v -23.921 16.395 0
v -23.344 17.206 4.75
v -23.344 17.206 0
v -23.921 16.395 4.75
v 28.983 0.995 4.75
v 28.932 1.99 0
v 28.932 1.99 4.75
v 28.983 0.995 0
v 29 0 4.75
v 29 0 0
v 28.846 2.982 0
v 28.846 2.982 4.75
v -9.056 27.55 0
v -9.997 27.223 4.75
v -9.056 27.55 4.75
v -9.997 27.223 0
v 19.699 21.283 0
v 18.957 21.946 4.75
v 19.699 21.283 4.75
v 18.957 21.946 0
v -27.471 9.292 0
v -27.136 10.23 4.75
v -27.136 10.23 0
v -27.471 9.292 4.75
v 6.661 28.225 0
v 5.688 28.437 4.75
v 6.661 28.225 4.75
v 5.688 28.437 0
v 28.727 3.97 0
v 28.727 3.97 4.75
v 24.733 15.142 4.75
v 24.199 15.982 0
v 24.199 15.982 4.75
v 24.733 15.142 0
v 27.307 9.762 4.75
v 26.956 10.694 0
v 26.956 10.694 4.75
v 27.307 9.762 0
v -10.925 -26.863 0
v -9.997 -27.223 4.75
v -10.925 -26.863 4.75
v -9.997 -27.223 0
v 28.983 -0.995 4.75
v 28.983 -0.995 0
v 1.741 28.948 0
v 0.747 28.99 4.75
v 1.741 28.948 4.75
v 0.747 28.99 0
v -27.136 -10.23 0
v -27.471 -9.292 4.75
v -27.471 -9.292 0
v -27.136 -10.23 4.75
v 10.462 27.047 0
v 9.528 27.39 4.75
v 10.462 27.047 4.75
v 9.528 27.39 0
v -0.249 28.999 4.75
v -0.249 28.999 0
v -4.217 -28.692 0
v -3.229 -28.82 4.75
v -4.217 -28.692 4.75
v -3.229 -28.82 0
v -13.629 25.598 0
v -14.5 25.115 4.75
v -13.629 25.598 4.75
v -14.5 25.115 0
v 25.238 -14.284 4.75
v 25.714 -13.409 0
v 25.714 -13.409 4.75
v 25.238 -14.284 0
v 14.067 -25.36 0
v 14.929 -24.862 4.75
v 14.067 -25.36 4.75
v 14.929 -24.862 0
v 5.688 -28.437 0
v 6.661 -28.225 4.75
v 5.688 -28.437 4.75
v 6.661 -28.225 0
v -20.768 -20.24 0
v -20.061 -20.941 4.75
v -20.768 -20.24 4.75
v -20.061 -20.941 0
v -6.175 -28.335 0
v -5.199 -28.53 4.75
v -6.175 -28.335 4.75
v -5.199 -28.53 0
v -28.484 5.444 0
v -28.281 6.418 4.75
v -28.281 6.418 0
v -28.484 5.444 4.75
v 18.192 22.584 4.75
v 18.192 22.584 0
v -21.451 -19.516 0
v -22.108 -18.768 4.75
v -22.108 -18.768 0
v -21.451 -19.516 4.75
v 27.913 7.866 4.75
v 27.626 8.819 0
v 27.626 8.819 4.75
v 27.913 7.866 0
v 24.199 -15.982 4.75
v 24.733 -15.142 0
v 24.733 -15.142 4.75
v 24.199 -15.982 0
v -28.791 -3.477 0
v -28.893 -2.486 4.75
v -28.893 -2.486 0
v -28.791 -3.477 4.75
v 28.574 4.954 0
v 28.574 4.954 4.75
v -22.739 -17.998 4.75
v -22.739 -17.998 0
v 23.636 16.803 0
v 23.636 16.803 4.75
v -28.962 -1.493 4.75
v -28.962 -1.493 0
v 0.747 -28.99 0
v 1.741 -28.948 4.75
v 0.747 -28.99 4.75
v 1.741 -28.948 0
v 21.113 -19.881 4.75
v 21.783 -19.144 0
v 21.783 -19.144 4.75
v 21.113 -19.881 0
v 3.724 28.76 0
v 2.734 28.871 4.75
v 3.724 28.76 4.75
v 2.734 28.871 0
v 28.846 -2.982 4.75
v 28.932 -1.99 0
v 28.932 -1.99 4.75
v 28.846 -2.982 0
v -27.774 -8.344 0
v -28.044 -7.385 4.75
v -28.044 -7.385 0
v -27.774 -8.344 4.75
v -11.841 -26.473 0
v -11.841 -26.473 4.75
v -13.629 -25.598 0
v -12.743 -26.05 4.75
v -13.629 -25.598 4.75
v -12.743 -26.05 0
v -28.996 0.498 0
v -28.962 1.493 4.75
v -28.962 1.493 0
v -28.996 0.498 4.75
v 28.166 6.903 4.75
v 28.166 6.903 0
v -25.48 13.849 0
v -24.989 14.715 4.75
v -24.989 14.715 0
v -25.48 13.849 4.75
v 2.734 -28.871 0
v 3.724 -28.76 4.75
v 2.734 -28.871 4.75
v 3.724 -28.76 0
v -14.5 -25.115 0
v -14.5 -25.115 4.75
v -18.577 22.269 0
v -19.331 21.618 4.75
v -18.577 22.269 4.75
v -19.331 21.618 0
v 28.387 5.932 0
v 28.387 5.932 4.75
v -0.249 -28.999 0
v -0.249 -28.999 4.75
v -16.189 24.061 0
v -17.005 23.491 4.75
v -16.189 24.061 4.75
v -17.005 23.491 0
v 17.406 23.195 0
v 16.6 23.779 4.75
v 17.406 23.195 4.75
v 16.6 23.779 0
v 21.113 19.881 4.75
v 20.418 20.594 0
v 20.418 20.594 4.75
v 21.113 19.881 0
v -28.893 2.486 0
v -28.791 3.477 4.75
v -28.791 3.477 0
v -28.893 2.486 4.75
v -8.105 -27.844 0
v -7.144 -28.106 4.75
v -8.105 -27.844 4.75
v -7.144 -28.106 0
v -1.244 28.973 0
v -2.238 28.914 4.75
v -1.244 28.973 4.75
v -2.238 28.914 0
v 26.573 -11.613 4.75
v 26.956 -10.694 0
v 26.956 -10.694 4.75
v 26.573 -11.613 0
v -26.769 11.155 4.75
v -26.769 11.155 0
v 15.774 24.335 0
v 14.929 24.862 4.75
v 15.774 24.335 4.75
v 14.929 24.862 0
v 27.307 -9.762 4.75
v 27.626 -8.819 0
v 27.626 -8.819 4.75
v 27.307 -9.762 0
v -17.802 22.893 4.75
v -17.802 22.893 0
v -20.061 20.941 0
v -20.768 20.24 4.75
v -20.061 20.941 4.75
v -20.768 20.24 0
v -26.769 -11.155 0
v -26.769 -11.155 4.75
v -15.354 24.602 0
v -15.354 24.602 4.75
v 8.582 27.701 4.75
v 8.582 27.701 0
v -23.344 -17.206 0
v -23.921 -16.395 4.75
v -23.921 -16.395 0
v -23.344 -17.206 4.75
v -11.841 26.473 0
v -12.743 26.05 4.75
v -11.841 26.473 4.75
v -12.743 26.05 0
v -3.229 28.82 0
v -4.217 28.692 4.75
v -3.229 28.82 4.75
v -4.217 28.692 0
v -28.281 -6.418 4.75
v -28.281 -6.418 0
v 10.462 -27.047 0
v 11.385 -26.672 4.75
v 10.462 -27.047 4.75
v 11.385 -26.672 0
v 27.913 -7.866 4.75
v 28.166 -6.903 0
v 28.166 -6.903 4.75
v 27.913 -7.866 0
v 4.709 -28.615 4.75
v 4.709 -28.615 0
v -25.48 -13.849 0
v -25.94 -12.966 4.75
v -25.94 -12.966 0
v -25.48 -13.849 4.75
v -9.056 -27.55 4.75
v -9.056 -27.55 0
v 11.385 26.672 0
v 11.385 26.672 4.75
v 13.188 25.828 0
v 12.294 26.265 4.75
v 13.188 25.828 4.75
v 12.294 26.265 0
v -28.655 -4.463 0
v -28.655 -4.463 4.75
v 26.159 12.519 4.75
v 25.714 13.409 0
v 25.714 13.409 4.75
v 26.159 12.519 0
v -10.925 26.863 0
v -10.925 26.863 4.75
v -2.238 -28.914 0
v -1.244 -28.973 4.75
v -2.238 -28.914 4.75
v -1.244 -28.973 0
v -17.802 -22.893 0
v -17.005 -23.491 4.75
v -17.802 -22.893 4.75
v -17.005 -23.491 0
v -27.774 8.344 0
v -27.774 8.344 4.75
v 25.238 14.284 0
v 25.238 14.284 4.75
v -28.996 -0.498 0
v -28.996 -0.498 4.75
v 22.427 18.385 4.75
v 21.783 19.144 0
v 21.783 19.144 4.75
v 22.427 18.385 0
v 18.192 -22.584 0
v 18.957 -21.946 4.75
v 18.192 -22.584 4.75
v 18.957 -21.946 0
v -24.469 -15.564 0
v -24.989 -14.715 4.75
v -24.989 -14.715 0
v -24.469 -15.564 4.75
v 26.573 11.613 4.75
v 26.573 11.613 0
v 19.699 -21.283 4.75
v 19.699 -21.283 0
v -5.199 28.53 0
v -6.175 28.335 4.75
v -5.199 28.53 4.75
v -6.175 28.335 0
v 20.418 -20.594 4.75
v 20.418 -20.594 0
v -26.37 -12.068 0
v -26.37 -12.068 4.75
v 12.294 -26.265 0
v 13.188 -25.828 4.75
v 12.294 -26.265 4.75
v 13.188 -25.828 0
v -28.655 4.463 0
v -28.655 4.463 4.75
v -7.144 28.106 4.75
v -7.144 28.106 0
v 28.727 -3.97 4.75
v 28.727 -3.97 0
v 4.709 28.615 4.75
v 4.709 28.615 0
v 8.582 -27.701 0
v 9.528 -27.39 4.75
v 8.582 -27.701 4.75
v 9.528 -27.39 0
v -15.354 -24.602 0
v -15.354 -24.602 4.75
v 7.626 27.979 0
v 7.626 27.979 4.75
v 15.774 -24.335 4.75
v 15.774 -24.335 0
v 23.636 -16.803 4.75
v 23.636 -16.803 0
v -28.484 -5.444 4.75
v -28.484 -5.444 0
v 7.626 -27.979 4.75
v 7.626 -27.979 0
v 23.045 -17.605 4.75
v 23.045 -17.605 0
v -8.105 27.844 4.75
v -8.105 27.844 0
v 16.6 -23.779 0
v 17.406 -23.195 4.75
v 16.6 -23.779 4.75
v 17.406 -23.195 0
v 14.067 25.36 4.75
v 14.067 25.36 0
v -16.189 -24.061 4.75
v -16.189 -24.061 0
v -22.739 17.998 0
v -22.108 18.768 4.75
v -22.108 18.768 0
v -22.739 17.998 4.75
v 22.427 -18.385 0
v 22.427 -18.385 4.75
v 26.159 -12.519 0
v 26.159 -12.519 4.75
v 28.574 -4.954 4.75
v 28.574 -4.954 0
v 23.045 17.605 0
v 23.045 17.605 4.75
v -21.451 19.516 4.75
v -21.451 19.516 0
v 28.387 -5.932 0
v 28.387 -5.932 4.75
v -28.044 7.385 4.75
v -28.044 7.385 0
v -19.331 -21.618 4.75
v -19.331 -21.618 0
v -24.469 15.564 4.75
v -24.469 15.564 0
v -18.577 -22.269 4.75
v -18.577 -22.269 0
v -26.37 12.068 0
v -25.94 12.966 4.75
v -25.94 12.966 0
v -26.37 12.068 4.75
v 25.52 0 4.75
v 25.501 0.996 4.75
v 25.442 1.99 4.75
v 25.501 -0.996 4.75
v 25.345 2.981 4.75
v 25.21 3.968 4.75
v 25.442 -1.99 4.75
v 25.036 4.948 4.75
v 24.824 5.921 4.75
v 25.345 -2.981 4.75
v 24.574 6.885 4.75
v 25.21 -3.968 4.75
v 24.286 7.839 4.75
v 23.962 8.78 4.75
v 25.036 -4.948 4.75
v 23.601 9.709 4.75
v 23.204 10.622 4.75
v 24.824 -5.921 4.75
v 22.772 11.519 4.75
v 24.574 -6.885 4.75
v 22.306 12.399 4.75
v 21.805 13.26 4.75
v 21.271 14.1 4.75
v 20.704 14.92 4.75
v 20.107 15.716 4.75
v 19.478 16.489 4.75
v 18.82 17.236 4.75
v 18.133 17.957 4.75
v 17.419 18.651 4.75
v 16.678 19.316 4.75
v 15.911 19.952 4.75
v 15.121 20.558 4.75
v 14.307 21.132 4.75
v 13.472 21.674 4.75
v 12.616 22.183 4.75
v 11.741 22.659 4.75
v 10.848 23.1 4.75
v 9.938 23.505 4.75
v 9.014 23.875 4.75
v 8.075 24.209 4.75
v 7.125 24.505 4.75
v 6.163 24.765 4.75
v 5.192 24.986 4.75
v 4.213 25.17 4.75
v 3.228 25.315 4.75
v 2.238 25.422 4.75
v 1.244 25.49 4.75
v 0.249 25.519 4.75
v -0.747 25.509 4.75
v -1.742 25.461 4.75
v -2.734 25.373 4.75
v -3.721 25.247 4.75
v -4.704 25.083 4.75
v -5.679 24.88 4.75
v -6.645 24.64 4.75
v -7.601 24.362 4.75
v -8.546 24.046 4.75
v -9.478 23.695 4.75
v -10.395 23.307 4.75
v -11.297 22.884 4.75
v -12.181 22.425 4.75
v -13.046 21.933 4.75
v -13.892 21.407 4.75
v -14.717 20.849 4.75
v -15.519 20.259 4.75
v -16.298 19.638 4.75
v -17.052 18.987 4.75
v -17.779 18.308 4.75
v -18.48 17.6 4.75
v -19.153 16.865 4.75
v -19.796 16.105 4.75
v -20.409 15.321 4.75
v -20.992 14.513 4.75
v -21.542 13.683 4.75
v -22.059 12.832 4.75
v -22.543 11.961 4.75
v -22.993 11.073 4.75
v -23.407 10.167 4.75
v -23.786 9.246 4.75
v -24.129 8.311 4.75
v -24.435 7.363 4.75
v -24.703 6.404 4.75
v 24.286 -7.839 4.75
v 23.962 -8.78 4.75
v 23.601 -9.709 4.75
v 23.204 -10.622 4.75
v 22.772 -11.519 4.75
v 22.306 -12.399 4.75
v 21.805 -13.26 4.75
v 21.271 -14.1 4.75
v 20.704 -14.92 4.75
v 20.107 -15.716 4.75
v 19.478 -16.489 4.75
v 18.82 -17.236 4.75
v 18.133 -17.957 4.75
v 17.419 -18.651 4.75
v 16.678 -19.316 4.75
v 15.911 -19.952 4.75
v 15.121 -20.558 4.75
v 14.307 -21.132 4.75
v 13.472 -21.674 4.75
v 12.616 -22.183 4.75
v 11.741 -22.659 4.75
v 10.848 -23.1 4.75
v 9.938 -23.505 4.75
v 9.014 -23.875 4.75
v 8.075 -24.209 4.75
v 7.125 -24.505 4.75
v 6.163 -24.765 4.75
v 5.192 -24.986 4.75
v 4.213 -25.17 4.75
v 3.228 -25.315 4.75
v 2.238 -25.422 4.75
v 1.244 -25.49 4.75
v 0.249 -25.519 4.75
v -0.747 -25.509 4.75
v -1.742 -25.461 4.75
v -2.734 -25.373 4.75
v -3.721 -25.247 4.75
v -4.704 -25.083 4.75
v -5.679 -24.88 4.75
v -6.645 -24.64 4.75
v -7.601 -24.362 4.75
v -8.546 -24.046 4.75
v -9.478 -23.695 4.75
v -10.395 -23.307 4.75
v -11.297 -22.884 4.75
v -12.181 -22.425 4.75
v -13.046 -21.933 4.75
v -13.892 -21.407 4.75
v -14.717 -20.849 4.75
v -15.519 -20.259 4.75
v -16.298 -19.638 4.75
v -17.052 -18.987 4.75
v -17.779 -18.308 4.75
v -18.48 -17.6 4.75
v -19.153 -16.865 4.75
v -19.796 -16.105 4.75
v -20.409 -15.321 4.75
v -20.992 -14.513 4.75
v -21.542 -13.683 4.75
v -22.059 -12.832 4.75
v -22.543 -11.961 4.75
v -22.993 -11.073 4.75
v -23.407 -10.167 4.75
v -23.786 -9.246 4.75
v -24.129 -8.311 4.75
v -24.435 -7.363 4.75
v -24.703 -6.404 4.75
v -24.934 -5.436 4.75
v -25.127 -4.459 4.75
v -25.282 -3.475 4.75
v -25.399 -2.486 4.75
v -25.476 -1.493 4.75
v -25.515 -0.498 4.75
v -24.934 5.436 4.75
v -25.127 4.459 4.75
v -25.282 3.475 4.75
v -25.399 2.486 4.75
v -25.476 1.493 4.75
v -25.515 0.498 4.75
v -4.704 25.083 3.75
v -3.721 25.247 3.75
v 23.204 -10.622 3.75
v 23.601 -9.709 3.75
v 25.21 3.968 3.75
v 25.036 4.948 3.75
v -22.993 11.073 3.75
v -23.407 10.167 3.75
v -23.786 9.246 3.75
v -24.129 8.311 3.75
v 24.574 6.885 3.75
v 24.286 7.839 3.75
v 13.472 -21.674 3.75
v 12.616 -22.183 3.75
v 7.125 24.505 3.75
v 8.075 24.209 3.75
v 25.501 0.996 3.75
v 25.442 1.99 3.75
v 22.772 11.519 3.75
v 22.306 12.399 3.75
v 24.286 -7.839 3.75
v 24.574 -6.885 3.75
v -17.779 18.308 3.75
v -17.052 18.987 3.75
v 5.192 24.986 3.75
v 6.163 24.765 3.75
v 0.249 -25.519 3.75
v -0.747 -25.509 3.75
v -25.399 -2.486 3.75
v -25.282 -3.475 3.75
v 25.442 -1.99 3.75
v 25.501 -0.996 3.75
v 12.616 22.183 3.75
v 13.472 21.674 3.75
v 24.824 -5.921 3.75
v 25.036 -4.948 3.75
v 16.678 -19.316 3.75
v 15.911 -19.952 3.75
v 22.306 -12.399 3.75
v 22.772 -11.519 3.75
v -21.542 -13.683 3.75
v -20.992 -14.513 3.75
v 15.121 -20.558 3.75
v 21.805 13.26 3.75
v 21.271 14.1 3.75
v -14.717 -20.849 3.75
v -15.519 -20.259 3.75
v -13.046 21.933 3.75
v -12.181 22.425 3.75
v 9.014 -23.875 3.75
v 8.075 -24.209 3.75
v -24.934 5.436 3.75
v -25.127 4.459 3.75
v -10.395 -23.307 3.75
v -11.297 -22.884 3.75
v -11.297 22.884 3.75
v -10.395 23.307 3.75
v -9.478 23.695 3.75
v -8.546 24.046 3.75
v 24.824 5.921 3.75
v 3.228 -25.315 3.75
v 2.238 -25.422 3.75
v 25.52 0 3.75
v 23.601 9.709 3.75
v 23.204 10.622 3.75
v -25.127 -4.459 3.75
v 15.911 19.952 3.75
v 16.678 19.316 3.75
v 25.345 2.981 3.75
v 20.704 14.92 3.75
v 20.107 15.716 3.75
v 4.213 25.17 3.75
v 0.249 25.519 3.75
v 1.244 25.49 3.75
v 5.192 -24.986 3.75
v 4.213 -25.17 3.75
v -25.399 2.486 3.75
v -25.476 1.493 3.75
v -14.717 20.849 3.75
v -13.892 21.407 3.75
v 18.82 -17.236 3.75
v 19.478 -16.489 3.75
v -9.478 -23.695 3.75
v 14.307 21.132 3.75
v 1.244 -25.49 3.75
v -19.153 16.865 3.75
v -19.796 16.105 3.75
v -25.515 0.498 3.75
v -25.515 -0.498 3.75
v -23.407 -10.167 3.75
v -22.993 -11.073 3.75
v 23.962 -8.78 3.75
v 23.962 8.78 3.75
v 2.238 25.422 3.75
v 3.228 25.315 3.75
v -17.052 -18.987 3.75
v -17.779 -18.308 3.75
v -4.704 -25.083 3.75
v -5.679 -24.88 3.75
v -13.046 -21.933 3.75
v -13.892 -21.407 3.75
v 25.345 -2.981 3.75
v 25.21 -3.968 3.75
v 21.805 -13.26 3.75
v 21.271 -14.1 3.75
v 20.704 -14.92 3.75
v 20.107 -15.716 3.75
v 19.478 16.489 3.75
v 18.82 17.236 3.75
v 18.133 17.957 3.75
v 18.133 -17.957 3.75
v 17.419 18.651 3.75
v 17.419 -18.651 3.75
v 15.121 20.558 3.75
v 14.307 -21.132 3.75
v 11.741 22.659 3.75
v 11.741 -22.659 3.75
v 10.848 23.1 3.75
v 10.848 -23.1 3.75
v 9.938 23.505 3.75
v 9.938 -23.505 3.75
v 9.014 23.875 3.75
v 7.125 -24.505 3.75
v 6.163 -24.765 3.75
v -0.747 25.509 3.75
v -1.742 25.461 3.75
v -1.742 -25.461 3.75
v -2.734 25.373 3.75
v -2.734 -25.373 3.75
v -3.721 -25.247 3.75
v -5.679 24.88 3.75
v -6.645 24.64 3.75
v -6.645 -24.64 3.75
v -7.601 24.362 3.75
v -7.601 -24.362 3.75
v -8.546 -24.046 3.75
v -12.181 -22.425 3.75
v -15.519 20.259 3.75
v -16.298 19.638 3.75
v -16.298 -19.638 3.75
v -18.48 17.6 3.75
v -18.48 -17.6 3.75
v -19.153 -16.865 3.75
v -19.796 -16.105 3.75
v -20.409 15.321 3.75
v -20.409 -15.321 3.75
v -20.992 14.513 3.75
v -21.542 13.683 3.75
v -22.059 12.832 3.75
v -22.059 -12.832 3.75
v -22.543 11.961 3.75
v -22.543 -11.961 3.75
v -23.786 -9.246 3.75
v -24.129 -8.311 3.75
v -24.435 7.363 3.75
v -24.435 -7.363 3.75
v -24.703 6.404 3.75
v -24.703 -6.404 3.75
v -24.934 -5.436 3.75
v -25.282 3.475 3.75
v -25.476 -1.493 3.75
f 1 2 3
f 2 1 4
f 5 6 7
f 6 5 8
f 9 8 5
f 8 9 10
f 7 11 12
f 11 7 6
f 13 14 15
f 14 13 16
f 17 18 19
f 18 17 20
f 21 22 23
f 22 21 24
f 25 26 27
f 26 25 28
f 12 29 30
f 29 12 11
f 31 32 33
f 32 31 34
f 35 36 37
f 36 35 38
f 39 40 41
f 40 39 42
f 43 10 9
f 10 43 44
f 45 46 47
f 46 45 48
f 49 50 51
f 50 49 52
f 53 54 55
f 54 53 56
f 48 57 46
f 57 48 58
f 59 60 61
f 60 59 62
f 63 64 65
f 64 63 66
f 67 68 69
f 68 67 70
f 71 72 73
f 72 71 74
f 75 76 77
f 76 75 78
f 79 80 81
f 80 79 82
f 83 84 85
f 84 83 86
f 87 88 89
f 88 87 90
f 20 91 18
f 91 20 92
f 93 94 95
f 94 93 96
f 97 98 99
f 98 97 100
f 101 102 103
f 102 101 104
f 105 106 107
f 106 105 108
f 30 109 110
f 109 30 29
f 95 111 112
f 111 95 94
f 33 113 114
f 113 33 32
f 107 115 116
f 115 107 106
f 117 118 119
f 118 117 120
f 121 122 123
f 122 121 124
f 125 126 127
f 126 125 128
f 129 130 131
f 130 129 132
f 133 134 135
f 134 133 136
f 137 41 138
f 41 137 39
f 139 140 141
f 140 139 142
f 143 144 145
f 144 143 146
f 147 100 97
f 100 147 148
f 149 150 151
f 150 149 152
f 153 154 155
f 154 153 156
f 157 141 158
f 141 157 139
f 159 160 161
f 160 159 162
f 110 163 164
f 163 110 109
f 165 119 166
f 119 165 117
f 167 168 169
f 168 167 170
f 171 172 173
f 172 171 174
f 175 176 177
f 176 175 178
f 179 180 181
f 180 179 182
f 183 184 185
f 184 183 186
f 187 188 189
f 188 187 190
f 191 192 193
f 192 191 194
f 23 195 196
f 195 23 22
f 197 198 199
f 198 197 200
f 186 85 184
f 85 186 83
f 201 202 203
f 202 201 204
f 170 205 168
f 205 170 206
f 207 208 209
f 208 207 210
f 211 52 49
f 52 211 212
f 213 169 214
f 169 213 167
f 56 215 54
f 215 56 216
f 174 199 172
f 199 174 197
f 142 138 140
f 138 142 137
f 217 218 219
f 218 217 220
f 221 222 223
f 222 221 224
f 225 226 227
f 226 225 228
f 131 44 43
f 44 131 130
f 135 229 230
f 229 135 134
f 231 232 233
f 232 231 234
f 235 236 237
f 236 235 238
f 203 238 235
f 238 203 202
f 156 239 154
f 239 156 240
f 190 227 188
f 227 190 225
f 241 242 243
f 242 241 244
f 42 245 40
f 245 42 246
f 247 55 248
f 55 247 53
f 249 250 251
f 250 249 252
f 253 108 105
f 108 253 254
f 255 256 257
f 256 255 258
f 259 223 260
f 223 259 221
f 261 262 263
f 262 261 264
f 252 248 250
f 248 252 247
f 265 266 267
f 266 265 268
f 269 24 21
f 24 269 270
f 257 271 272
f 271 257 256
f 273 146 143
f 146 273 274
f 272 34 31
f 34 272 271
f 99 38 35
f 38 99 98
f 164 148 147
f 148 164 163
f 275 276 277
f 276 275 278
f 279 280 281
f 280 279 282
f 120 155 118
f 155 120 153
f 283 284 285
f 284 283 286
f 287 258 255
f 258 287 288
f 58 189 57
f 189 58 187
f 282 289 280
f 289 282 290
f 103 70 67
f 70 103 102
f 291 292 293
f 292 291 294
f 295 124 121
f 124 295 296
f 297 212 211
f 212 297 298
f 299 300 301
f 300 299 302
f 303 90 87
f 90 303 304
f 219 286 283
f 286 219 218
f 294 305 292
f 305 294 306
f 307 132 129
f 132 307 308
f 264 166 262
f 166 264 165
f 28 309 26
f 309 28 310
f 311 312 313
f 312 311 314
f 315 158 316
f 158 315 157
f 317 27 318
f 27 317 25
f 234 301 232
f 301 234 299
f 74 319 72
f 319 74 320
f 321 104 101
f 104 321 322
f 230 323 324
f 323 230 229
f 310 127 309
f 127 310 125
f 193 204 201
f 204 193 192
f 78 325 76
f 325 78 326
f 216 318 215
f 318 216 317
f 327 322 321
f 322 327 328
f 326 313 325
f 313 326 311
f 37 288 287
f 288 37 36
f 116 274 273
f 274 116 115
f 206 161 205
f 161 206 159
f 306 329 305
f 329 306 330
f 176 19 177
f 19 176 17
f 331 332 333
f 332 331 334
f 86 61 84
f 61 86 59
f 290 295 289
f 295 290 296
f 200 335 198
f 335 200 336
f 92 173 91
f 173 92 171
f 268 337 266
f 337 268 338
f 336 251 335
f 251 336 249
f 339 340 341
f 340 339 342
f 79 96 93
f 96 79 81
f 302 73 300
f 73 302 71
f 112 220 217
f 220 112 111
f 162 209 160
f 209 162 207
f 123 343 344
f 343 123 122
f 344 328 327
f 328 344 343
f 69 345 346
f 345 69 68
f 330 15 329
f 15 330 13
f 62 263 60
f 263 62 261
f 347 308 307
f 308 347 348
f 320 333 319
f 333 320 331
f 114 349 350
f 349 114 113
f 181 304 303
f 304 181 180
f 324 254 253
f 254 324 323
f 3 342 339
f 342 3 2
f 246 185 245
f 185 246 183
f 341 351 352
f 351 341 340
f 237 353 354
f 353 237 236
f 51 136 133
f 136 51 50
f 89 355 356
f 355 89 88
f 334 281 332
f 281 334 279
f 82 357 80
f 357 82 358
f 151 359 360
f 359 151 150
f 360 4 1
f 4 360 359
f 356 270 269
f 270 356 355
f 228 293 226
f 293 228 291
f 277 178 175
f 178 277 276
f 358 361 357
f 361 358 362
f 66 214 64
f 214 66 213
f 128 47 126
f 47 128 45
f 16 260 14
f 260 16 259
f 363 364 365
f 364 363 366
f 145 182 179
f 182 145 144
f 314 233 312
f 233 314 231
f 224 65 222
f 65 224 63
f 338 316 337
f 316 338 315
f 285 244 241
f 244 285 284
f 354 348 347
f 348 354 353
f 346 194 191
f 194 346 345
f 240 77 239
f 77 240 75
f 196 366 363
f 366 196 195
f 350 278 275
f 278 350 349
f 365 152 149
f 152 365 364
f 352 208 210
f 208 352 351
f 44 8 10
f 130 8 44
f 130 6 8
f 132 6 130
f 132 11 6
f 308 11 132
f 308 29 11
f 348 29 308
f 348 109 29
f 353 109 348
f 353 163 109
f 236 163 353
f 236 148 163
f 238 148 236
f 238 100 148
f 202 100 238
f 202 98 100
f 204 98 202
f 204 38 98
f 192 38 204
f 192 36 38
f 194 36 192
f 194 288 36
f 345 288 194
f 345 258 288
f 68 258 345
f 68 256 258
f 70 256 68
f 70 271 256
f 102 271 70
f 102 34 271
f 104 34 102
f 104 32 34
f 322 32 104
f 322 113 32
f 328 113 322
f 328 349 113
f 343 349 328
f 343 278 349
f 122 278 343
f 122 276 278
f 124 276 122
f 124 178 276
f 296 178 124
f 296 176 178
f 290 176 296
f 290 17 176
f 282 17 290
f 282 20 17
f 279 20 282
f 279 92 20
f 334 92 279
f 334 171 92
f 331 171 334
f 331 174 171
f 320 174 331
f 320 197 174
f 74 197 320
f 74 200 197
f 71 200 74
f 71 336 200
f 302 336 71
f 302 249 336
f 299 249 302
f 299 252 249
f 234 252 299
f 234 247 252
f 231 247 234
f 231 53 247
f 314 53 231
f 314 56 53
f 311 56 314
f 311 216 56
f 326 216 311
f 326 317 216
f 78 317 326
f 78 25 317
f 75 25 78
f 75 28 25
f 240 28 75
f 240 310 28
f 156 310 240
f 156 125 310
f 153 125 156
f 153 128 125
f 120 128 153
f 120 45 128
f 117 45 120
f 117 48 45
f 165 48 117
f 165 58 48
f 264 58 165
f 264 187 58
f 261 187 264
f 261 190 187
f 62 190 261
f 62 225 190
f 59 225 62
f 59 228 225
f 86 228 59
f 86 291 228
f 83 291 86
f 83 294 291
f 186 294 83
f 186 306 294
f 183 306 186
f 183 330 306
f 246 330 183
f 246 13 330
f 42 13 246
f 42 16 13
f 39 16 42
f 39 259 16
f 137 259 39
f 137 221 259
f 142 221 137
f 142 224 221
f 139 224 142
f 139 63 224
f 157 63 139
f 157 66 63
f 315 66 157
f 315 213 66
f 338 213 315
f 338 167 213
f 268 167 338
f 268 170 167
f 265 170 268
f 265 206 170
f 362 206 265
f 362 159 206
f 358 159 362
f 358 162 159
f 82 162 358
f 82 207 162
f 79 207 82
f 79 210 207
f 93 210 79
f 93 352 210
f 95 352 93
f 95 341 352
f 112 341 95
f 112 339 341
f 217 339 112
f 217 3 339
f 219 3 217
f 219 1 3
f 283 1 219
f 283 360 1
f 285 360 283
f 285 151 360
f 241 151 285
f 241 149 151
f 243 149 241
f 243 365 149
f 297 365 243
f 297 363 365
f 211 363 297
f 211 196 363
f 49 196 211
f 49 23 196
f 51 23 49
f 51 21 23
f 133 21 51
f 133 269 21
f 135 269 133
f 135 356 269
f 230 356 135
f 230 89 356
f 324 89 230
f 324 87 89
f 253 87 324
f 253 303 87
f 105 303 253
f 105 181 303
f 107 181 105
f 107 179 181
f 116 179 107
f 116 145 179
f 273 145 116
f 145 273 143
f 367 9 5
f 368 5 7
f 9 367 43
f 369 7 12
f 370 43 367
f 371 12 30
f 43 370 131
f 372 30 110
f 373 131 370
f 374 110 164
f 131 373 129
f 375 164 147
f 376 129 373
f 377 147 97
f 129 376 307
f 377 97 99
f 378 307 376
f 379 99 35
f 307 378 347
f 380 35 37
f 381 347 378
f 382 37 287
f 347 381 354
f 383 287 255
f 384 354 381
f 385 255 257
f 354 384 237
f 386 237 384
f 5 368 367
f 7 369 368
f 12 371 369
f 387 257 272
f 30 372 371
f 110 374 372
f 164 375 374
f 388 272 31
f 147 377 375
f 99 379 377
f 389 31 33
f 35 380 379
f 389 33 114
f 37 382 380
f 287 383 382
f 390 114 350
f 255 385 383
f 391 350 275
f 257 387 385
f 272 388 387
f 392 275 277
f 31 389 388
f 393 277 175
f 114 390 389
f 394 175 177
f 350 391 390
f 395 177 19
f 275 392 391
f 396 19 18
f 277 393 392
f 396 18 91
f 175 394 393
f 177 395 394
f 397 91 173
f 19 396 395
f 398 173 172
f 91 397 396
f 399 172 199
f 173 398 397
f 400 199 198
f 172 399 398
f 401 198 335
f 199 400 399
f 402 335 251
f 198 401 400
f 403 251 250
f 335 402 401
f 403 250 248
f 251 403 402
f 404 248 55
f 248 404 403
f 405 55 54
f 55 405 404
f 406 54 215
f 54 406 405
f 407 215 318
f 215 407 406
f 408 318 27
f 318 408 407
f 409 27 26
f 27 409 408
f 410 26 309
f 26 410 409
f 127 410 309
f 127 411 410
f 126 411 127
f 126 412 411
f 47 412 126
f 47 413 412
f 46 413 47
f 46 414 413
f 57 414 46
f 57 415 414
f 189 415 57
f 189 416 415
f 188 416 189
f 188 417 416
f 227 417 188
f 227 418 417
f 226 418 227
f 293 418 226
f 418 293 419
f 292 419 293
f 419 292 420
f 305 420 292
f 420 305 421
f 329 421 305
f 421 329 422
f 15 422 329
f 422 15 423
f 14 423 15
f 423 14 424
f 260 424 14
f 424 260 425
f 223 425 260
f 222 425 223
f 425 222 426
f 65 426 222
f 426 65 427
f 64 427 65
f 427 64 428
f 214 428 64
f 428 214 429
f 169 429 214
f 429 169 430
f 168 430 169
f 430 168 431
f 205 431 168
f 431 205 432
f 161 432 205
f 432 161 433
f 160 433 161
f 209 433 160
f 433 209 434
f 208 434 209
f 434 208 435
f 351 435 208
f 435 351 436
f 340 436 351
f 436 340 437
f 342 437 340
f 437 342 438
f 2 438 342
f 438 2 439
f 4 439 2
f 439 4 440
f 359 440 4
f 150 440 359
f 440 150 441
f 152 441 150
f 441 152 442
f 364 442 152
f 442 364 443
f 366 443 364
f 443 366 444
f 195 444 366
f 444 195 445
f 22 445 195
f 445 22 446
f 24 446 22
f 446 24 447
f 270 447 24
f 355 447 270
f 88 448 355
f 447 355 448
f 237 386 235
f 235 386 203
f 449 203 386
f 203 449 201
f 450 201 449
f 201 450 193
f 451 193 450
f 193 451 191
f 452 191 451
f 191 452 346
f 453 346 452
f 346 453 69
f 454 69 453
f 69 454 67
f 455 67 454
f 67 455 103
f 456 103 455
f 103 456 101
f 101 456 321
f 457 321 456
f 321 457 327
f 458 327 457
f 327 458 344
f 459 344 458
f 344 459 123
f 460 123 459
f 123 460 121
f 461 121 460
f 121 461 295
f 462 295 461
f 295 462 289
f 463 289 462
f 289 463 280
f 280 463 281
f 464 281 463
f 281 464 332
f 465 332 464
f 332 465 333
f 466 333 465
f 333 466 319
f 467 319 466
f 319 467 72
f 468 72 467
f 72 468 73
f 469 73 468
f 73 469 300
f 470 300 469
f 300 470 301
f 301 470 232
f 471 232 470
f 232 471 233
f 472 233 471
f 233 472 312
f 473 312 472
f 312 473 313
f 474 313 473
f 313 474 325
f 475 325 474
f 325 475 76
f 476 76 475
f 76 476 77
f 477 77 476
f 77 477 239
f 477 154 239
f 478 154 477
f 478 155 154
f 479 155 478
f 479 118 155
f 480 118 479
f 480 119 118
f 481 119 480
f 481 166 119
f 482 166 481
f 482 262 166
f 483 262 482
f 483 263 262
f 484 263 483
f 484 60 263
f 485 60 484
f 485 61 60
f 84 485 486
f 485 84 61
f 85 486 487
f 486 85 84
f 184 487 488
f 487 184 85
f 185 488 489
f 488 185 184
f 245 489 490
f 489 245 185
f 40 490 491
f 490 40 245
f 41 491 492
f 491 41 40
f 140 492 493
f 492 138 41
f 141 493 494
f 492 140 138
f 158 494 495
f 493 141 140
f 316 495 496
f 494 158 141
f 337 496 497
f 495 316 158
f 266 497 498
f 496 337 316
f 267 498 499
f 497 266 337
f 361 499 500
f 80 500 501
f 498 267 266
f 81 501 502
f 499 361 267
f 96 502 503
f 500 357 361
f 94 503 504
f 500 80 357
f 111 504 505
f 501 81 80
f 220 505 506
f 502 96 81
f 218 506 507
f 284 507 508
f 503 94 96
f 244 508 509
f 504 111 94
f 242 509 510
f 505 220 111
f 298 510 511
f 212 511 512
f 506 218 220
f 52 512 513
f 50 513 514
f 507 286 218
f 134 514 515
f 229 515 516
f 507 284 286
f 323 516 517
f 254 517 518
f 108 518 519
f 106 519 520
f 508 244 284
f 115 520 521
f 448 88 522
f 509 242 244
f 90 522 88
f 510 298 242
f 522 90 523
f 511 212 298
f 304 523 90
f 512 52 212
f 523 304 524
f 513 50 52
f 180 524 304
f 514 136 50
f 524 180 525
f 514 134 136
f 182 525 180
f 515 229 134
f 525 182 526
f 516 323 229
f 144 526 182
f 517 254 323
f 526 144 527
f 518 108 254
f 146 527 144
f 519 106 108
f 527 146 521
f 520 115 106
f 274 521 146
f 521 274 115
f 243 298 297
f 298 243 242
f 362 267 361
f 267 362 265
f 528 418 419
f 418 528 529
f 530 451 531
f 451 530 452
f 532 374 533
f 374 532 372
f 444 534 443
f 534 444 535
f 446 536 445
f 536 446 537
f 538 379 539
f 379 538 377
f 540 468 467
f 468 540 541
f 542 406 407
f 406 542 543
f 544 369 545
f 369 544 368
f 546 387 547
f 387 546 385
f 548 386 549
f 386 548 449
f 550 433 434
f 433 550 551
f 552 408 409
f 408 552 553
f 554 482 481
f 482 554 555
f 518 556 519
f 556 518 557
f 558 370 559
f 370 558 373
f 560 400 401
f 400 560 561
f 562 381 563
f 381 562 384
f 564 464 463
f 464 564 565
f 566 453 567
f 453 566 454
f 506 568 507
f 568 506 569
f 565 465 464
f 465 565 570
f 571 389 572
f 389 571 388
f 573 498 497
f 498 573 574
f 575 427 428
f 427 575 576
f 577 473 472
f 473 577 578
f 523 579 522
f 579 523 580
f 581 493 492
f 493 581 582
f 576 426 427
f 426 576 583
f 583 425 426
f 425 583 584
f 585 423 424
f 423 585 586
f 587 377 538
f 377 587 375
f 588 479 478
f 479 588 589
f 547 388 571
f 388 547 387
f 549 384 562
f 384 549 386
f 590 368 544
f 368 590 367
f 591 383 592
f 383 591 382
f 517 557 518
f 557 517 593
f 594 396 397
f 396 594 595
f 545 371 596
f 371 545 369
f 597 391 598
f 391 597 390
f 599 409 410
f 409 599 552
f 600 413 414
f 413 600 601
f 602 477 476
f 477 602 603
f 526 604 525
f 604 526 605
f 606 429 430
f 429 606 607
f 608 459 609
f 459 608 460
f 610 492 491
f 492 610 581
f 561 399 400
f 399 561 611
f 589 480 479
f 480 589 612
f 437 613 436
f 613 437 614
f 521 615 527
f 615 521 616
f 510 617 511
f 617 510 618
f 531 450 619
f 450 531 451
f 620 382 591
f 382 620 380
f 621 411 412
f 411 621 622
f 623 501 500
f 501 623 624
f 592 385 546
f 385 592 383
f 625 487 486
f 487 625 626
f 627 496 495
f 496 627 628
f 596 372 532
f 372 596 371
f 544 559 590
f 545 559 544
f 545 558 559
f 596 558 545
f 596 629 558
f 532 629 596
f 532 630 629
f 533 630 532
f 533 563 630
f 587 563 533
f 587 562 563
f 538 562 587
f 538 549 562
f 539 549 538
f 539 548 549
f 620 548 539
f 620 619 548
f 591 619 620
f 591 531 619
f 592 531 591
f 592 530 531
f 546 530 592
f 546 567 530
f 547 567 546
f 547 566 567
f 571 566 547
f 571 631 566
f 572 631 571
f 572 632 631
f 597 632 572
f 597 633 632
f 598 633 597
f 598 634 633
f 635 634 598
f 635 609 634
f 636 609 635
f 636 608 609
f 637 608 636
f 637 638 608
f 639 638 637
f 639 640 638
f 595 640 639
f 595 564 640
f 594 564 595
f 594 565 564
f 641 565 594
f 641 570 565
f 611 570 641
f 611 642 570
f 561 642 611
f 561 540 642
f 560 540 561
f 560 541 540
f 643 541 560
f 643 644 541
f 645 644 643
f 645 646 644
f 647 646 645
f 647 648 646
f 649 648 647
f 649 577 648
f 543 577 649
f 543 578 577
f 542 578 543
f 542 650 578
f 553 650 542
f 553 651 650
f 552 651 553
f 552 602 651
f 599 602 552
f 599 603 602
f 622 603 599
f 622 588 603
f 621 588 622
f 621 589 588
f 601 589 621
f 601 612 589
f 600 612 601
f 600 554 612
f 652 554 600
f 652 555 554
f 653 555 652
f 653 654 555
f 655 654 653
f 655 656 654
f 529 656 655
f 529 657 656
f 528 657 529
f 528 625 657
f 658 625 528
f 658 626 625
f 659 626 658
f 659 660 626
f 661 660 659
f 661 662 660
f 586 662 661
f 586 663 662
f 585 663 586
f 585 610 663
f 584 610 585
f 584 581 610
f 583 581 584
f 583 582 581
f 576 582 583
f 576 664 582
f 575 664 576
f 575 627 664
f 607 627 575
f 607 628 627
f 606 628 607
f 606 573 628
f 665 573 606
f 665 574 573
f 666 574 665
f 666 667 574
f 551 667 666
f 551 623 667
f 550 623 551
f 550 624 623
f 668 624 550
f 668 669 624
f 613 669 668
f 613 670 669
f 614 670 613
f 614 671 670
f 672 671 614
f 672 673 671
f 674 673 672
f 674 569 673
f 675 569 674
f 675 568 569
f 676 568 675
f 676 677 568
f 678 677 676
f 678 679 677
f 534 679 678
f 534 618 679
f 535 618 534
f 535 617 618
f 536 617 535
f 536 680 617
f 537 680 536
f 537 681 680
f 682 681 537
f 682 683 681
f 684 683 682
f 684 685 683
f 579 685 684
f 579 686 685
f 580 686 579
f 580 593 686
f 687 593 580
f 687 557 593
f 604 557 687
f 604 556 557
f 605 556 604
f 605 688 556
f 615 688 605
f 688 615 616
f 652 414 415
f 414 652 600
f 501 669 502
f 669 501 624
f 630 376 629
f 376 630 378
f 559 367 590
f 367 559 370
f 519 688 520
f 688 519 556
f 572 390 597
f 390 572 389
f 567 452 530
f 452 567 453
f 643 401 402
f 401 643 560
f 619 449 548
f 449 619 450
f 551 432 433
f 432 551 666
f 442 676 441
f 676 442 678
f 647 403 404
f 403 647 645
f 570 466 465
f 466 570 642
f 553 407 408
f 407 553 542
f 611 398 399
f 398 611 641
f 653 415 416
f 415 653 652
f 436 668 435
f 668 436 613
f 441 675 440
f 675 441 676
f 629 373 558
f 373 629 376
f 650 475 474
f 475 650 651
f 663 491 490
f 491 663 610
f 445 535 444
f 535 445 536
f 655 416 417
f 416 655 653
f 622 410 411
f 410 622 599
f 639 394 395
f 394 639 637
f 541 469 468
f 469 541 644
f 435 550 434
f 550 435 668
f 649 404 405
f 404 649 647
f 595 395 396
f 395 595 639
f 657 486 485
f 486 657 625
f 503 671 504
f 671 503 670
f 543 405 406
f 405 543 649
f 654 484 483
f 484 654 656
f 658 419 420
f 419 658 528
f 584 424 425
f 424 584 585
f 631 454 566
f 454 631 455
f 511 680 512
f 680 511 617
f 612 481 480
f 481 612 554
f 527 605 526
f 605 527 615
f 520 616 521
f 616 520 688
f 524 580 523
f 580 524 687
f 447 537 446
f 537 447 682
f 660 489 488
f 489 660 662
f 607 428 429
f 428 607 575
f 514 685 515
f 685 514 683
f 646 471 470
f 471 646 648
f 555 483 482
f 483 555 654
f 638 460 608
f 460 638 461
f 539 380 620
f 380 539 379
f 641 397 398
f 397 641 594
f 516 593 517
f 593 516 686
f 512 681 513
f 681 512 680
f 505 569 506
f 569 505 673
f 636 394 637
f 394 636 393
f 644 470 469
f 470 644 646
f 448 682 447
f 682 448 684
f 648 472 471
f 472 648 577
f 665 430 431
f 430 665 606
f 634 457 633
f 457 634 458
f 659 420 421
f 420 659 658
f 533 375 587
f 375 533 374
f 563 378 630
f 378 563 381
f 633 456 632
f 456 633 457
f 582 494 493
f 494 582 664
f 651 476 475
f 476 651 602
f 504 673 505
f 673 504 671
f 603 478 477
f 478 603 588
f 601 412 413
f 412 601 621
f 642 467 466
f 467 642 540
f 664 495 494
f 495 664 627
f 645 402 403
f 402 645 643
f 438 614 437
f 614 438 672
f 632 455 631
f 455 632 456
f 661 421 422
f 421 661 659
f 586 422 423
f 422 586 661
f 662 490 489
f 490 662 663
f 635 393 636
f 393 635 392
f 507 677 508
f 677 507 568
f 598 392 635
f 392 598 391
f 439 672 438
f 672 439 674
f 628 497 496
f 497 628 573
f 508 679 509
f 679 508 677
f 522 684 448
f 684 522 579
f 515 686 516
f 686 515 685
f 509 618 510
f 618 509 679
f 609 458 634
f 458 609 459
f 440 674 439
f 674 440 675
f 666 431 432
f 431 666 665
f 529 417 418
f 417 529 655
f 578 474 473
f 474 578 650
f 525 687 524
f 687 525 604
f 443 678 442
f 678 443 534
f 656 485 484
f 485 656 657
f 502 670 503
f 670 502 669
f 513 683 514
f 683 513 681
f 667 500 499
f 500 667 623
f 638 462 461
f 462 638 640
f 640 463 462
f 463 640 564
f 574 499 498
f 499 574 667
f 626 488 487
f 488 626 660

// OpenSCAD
module air_hockey_puck(diameter=70, height=4.75) {
    difference() {
        cylinder(r=diameter/2, h=height, $fs=1, $fa=1);
        translate([0, 0, height - 1]) cylinder(r=diameter/2*.88, h=1.01, $fs=1, $fa=1);
    }
}


air_hockey_puck(diameter=58);
